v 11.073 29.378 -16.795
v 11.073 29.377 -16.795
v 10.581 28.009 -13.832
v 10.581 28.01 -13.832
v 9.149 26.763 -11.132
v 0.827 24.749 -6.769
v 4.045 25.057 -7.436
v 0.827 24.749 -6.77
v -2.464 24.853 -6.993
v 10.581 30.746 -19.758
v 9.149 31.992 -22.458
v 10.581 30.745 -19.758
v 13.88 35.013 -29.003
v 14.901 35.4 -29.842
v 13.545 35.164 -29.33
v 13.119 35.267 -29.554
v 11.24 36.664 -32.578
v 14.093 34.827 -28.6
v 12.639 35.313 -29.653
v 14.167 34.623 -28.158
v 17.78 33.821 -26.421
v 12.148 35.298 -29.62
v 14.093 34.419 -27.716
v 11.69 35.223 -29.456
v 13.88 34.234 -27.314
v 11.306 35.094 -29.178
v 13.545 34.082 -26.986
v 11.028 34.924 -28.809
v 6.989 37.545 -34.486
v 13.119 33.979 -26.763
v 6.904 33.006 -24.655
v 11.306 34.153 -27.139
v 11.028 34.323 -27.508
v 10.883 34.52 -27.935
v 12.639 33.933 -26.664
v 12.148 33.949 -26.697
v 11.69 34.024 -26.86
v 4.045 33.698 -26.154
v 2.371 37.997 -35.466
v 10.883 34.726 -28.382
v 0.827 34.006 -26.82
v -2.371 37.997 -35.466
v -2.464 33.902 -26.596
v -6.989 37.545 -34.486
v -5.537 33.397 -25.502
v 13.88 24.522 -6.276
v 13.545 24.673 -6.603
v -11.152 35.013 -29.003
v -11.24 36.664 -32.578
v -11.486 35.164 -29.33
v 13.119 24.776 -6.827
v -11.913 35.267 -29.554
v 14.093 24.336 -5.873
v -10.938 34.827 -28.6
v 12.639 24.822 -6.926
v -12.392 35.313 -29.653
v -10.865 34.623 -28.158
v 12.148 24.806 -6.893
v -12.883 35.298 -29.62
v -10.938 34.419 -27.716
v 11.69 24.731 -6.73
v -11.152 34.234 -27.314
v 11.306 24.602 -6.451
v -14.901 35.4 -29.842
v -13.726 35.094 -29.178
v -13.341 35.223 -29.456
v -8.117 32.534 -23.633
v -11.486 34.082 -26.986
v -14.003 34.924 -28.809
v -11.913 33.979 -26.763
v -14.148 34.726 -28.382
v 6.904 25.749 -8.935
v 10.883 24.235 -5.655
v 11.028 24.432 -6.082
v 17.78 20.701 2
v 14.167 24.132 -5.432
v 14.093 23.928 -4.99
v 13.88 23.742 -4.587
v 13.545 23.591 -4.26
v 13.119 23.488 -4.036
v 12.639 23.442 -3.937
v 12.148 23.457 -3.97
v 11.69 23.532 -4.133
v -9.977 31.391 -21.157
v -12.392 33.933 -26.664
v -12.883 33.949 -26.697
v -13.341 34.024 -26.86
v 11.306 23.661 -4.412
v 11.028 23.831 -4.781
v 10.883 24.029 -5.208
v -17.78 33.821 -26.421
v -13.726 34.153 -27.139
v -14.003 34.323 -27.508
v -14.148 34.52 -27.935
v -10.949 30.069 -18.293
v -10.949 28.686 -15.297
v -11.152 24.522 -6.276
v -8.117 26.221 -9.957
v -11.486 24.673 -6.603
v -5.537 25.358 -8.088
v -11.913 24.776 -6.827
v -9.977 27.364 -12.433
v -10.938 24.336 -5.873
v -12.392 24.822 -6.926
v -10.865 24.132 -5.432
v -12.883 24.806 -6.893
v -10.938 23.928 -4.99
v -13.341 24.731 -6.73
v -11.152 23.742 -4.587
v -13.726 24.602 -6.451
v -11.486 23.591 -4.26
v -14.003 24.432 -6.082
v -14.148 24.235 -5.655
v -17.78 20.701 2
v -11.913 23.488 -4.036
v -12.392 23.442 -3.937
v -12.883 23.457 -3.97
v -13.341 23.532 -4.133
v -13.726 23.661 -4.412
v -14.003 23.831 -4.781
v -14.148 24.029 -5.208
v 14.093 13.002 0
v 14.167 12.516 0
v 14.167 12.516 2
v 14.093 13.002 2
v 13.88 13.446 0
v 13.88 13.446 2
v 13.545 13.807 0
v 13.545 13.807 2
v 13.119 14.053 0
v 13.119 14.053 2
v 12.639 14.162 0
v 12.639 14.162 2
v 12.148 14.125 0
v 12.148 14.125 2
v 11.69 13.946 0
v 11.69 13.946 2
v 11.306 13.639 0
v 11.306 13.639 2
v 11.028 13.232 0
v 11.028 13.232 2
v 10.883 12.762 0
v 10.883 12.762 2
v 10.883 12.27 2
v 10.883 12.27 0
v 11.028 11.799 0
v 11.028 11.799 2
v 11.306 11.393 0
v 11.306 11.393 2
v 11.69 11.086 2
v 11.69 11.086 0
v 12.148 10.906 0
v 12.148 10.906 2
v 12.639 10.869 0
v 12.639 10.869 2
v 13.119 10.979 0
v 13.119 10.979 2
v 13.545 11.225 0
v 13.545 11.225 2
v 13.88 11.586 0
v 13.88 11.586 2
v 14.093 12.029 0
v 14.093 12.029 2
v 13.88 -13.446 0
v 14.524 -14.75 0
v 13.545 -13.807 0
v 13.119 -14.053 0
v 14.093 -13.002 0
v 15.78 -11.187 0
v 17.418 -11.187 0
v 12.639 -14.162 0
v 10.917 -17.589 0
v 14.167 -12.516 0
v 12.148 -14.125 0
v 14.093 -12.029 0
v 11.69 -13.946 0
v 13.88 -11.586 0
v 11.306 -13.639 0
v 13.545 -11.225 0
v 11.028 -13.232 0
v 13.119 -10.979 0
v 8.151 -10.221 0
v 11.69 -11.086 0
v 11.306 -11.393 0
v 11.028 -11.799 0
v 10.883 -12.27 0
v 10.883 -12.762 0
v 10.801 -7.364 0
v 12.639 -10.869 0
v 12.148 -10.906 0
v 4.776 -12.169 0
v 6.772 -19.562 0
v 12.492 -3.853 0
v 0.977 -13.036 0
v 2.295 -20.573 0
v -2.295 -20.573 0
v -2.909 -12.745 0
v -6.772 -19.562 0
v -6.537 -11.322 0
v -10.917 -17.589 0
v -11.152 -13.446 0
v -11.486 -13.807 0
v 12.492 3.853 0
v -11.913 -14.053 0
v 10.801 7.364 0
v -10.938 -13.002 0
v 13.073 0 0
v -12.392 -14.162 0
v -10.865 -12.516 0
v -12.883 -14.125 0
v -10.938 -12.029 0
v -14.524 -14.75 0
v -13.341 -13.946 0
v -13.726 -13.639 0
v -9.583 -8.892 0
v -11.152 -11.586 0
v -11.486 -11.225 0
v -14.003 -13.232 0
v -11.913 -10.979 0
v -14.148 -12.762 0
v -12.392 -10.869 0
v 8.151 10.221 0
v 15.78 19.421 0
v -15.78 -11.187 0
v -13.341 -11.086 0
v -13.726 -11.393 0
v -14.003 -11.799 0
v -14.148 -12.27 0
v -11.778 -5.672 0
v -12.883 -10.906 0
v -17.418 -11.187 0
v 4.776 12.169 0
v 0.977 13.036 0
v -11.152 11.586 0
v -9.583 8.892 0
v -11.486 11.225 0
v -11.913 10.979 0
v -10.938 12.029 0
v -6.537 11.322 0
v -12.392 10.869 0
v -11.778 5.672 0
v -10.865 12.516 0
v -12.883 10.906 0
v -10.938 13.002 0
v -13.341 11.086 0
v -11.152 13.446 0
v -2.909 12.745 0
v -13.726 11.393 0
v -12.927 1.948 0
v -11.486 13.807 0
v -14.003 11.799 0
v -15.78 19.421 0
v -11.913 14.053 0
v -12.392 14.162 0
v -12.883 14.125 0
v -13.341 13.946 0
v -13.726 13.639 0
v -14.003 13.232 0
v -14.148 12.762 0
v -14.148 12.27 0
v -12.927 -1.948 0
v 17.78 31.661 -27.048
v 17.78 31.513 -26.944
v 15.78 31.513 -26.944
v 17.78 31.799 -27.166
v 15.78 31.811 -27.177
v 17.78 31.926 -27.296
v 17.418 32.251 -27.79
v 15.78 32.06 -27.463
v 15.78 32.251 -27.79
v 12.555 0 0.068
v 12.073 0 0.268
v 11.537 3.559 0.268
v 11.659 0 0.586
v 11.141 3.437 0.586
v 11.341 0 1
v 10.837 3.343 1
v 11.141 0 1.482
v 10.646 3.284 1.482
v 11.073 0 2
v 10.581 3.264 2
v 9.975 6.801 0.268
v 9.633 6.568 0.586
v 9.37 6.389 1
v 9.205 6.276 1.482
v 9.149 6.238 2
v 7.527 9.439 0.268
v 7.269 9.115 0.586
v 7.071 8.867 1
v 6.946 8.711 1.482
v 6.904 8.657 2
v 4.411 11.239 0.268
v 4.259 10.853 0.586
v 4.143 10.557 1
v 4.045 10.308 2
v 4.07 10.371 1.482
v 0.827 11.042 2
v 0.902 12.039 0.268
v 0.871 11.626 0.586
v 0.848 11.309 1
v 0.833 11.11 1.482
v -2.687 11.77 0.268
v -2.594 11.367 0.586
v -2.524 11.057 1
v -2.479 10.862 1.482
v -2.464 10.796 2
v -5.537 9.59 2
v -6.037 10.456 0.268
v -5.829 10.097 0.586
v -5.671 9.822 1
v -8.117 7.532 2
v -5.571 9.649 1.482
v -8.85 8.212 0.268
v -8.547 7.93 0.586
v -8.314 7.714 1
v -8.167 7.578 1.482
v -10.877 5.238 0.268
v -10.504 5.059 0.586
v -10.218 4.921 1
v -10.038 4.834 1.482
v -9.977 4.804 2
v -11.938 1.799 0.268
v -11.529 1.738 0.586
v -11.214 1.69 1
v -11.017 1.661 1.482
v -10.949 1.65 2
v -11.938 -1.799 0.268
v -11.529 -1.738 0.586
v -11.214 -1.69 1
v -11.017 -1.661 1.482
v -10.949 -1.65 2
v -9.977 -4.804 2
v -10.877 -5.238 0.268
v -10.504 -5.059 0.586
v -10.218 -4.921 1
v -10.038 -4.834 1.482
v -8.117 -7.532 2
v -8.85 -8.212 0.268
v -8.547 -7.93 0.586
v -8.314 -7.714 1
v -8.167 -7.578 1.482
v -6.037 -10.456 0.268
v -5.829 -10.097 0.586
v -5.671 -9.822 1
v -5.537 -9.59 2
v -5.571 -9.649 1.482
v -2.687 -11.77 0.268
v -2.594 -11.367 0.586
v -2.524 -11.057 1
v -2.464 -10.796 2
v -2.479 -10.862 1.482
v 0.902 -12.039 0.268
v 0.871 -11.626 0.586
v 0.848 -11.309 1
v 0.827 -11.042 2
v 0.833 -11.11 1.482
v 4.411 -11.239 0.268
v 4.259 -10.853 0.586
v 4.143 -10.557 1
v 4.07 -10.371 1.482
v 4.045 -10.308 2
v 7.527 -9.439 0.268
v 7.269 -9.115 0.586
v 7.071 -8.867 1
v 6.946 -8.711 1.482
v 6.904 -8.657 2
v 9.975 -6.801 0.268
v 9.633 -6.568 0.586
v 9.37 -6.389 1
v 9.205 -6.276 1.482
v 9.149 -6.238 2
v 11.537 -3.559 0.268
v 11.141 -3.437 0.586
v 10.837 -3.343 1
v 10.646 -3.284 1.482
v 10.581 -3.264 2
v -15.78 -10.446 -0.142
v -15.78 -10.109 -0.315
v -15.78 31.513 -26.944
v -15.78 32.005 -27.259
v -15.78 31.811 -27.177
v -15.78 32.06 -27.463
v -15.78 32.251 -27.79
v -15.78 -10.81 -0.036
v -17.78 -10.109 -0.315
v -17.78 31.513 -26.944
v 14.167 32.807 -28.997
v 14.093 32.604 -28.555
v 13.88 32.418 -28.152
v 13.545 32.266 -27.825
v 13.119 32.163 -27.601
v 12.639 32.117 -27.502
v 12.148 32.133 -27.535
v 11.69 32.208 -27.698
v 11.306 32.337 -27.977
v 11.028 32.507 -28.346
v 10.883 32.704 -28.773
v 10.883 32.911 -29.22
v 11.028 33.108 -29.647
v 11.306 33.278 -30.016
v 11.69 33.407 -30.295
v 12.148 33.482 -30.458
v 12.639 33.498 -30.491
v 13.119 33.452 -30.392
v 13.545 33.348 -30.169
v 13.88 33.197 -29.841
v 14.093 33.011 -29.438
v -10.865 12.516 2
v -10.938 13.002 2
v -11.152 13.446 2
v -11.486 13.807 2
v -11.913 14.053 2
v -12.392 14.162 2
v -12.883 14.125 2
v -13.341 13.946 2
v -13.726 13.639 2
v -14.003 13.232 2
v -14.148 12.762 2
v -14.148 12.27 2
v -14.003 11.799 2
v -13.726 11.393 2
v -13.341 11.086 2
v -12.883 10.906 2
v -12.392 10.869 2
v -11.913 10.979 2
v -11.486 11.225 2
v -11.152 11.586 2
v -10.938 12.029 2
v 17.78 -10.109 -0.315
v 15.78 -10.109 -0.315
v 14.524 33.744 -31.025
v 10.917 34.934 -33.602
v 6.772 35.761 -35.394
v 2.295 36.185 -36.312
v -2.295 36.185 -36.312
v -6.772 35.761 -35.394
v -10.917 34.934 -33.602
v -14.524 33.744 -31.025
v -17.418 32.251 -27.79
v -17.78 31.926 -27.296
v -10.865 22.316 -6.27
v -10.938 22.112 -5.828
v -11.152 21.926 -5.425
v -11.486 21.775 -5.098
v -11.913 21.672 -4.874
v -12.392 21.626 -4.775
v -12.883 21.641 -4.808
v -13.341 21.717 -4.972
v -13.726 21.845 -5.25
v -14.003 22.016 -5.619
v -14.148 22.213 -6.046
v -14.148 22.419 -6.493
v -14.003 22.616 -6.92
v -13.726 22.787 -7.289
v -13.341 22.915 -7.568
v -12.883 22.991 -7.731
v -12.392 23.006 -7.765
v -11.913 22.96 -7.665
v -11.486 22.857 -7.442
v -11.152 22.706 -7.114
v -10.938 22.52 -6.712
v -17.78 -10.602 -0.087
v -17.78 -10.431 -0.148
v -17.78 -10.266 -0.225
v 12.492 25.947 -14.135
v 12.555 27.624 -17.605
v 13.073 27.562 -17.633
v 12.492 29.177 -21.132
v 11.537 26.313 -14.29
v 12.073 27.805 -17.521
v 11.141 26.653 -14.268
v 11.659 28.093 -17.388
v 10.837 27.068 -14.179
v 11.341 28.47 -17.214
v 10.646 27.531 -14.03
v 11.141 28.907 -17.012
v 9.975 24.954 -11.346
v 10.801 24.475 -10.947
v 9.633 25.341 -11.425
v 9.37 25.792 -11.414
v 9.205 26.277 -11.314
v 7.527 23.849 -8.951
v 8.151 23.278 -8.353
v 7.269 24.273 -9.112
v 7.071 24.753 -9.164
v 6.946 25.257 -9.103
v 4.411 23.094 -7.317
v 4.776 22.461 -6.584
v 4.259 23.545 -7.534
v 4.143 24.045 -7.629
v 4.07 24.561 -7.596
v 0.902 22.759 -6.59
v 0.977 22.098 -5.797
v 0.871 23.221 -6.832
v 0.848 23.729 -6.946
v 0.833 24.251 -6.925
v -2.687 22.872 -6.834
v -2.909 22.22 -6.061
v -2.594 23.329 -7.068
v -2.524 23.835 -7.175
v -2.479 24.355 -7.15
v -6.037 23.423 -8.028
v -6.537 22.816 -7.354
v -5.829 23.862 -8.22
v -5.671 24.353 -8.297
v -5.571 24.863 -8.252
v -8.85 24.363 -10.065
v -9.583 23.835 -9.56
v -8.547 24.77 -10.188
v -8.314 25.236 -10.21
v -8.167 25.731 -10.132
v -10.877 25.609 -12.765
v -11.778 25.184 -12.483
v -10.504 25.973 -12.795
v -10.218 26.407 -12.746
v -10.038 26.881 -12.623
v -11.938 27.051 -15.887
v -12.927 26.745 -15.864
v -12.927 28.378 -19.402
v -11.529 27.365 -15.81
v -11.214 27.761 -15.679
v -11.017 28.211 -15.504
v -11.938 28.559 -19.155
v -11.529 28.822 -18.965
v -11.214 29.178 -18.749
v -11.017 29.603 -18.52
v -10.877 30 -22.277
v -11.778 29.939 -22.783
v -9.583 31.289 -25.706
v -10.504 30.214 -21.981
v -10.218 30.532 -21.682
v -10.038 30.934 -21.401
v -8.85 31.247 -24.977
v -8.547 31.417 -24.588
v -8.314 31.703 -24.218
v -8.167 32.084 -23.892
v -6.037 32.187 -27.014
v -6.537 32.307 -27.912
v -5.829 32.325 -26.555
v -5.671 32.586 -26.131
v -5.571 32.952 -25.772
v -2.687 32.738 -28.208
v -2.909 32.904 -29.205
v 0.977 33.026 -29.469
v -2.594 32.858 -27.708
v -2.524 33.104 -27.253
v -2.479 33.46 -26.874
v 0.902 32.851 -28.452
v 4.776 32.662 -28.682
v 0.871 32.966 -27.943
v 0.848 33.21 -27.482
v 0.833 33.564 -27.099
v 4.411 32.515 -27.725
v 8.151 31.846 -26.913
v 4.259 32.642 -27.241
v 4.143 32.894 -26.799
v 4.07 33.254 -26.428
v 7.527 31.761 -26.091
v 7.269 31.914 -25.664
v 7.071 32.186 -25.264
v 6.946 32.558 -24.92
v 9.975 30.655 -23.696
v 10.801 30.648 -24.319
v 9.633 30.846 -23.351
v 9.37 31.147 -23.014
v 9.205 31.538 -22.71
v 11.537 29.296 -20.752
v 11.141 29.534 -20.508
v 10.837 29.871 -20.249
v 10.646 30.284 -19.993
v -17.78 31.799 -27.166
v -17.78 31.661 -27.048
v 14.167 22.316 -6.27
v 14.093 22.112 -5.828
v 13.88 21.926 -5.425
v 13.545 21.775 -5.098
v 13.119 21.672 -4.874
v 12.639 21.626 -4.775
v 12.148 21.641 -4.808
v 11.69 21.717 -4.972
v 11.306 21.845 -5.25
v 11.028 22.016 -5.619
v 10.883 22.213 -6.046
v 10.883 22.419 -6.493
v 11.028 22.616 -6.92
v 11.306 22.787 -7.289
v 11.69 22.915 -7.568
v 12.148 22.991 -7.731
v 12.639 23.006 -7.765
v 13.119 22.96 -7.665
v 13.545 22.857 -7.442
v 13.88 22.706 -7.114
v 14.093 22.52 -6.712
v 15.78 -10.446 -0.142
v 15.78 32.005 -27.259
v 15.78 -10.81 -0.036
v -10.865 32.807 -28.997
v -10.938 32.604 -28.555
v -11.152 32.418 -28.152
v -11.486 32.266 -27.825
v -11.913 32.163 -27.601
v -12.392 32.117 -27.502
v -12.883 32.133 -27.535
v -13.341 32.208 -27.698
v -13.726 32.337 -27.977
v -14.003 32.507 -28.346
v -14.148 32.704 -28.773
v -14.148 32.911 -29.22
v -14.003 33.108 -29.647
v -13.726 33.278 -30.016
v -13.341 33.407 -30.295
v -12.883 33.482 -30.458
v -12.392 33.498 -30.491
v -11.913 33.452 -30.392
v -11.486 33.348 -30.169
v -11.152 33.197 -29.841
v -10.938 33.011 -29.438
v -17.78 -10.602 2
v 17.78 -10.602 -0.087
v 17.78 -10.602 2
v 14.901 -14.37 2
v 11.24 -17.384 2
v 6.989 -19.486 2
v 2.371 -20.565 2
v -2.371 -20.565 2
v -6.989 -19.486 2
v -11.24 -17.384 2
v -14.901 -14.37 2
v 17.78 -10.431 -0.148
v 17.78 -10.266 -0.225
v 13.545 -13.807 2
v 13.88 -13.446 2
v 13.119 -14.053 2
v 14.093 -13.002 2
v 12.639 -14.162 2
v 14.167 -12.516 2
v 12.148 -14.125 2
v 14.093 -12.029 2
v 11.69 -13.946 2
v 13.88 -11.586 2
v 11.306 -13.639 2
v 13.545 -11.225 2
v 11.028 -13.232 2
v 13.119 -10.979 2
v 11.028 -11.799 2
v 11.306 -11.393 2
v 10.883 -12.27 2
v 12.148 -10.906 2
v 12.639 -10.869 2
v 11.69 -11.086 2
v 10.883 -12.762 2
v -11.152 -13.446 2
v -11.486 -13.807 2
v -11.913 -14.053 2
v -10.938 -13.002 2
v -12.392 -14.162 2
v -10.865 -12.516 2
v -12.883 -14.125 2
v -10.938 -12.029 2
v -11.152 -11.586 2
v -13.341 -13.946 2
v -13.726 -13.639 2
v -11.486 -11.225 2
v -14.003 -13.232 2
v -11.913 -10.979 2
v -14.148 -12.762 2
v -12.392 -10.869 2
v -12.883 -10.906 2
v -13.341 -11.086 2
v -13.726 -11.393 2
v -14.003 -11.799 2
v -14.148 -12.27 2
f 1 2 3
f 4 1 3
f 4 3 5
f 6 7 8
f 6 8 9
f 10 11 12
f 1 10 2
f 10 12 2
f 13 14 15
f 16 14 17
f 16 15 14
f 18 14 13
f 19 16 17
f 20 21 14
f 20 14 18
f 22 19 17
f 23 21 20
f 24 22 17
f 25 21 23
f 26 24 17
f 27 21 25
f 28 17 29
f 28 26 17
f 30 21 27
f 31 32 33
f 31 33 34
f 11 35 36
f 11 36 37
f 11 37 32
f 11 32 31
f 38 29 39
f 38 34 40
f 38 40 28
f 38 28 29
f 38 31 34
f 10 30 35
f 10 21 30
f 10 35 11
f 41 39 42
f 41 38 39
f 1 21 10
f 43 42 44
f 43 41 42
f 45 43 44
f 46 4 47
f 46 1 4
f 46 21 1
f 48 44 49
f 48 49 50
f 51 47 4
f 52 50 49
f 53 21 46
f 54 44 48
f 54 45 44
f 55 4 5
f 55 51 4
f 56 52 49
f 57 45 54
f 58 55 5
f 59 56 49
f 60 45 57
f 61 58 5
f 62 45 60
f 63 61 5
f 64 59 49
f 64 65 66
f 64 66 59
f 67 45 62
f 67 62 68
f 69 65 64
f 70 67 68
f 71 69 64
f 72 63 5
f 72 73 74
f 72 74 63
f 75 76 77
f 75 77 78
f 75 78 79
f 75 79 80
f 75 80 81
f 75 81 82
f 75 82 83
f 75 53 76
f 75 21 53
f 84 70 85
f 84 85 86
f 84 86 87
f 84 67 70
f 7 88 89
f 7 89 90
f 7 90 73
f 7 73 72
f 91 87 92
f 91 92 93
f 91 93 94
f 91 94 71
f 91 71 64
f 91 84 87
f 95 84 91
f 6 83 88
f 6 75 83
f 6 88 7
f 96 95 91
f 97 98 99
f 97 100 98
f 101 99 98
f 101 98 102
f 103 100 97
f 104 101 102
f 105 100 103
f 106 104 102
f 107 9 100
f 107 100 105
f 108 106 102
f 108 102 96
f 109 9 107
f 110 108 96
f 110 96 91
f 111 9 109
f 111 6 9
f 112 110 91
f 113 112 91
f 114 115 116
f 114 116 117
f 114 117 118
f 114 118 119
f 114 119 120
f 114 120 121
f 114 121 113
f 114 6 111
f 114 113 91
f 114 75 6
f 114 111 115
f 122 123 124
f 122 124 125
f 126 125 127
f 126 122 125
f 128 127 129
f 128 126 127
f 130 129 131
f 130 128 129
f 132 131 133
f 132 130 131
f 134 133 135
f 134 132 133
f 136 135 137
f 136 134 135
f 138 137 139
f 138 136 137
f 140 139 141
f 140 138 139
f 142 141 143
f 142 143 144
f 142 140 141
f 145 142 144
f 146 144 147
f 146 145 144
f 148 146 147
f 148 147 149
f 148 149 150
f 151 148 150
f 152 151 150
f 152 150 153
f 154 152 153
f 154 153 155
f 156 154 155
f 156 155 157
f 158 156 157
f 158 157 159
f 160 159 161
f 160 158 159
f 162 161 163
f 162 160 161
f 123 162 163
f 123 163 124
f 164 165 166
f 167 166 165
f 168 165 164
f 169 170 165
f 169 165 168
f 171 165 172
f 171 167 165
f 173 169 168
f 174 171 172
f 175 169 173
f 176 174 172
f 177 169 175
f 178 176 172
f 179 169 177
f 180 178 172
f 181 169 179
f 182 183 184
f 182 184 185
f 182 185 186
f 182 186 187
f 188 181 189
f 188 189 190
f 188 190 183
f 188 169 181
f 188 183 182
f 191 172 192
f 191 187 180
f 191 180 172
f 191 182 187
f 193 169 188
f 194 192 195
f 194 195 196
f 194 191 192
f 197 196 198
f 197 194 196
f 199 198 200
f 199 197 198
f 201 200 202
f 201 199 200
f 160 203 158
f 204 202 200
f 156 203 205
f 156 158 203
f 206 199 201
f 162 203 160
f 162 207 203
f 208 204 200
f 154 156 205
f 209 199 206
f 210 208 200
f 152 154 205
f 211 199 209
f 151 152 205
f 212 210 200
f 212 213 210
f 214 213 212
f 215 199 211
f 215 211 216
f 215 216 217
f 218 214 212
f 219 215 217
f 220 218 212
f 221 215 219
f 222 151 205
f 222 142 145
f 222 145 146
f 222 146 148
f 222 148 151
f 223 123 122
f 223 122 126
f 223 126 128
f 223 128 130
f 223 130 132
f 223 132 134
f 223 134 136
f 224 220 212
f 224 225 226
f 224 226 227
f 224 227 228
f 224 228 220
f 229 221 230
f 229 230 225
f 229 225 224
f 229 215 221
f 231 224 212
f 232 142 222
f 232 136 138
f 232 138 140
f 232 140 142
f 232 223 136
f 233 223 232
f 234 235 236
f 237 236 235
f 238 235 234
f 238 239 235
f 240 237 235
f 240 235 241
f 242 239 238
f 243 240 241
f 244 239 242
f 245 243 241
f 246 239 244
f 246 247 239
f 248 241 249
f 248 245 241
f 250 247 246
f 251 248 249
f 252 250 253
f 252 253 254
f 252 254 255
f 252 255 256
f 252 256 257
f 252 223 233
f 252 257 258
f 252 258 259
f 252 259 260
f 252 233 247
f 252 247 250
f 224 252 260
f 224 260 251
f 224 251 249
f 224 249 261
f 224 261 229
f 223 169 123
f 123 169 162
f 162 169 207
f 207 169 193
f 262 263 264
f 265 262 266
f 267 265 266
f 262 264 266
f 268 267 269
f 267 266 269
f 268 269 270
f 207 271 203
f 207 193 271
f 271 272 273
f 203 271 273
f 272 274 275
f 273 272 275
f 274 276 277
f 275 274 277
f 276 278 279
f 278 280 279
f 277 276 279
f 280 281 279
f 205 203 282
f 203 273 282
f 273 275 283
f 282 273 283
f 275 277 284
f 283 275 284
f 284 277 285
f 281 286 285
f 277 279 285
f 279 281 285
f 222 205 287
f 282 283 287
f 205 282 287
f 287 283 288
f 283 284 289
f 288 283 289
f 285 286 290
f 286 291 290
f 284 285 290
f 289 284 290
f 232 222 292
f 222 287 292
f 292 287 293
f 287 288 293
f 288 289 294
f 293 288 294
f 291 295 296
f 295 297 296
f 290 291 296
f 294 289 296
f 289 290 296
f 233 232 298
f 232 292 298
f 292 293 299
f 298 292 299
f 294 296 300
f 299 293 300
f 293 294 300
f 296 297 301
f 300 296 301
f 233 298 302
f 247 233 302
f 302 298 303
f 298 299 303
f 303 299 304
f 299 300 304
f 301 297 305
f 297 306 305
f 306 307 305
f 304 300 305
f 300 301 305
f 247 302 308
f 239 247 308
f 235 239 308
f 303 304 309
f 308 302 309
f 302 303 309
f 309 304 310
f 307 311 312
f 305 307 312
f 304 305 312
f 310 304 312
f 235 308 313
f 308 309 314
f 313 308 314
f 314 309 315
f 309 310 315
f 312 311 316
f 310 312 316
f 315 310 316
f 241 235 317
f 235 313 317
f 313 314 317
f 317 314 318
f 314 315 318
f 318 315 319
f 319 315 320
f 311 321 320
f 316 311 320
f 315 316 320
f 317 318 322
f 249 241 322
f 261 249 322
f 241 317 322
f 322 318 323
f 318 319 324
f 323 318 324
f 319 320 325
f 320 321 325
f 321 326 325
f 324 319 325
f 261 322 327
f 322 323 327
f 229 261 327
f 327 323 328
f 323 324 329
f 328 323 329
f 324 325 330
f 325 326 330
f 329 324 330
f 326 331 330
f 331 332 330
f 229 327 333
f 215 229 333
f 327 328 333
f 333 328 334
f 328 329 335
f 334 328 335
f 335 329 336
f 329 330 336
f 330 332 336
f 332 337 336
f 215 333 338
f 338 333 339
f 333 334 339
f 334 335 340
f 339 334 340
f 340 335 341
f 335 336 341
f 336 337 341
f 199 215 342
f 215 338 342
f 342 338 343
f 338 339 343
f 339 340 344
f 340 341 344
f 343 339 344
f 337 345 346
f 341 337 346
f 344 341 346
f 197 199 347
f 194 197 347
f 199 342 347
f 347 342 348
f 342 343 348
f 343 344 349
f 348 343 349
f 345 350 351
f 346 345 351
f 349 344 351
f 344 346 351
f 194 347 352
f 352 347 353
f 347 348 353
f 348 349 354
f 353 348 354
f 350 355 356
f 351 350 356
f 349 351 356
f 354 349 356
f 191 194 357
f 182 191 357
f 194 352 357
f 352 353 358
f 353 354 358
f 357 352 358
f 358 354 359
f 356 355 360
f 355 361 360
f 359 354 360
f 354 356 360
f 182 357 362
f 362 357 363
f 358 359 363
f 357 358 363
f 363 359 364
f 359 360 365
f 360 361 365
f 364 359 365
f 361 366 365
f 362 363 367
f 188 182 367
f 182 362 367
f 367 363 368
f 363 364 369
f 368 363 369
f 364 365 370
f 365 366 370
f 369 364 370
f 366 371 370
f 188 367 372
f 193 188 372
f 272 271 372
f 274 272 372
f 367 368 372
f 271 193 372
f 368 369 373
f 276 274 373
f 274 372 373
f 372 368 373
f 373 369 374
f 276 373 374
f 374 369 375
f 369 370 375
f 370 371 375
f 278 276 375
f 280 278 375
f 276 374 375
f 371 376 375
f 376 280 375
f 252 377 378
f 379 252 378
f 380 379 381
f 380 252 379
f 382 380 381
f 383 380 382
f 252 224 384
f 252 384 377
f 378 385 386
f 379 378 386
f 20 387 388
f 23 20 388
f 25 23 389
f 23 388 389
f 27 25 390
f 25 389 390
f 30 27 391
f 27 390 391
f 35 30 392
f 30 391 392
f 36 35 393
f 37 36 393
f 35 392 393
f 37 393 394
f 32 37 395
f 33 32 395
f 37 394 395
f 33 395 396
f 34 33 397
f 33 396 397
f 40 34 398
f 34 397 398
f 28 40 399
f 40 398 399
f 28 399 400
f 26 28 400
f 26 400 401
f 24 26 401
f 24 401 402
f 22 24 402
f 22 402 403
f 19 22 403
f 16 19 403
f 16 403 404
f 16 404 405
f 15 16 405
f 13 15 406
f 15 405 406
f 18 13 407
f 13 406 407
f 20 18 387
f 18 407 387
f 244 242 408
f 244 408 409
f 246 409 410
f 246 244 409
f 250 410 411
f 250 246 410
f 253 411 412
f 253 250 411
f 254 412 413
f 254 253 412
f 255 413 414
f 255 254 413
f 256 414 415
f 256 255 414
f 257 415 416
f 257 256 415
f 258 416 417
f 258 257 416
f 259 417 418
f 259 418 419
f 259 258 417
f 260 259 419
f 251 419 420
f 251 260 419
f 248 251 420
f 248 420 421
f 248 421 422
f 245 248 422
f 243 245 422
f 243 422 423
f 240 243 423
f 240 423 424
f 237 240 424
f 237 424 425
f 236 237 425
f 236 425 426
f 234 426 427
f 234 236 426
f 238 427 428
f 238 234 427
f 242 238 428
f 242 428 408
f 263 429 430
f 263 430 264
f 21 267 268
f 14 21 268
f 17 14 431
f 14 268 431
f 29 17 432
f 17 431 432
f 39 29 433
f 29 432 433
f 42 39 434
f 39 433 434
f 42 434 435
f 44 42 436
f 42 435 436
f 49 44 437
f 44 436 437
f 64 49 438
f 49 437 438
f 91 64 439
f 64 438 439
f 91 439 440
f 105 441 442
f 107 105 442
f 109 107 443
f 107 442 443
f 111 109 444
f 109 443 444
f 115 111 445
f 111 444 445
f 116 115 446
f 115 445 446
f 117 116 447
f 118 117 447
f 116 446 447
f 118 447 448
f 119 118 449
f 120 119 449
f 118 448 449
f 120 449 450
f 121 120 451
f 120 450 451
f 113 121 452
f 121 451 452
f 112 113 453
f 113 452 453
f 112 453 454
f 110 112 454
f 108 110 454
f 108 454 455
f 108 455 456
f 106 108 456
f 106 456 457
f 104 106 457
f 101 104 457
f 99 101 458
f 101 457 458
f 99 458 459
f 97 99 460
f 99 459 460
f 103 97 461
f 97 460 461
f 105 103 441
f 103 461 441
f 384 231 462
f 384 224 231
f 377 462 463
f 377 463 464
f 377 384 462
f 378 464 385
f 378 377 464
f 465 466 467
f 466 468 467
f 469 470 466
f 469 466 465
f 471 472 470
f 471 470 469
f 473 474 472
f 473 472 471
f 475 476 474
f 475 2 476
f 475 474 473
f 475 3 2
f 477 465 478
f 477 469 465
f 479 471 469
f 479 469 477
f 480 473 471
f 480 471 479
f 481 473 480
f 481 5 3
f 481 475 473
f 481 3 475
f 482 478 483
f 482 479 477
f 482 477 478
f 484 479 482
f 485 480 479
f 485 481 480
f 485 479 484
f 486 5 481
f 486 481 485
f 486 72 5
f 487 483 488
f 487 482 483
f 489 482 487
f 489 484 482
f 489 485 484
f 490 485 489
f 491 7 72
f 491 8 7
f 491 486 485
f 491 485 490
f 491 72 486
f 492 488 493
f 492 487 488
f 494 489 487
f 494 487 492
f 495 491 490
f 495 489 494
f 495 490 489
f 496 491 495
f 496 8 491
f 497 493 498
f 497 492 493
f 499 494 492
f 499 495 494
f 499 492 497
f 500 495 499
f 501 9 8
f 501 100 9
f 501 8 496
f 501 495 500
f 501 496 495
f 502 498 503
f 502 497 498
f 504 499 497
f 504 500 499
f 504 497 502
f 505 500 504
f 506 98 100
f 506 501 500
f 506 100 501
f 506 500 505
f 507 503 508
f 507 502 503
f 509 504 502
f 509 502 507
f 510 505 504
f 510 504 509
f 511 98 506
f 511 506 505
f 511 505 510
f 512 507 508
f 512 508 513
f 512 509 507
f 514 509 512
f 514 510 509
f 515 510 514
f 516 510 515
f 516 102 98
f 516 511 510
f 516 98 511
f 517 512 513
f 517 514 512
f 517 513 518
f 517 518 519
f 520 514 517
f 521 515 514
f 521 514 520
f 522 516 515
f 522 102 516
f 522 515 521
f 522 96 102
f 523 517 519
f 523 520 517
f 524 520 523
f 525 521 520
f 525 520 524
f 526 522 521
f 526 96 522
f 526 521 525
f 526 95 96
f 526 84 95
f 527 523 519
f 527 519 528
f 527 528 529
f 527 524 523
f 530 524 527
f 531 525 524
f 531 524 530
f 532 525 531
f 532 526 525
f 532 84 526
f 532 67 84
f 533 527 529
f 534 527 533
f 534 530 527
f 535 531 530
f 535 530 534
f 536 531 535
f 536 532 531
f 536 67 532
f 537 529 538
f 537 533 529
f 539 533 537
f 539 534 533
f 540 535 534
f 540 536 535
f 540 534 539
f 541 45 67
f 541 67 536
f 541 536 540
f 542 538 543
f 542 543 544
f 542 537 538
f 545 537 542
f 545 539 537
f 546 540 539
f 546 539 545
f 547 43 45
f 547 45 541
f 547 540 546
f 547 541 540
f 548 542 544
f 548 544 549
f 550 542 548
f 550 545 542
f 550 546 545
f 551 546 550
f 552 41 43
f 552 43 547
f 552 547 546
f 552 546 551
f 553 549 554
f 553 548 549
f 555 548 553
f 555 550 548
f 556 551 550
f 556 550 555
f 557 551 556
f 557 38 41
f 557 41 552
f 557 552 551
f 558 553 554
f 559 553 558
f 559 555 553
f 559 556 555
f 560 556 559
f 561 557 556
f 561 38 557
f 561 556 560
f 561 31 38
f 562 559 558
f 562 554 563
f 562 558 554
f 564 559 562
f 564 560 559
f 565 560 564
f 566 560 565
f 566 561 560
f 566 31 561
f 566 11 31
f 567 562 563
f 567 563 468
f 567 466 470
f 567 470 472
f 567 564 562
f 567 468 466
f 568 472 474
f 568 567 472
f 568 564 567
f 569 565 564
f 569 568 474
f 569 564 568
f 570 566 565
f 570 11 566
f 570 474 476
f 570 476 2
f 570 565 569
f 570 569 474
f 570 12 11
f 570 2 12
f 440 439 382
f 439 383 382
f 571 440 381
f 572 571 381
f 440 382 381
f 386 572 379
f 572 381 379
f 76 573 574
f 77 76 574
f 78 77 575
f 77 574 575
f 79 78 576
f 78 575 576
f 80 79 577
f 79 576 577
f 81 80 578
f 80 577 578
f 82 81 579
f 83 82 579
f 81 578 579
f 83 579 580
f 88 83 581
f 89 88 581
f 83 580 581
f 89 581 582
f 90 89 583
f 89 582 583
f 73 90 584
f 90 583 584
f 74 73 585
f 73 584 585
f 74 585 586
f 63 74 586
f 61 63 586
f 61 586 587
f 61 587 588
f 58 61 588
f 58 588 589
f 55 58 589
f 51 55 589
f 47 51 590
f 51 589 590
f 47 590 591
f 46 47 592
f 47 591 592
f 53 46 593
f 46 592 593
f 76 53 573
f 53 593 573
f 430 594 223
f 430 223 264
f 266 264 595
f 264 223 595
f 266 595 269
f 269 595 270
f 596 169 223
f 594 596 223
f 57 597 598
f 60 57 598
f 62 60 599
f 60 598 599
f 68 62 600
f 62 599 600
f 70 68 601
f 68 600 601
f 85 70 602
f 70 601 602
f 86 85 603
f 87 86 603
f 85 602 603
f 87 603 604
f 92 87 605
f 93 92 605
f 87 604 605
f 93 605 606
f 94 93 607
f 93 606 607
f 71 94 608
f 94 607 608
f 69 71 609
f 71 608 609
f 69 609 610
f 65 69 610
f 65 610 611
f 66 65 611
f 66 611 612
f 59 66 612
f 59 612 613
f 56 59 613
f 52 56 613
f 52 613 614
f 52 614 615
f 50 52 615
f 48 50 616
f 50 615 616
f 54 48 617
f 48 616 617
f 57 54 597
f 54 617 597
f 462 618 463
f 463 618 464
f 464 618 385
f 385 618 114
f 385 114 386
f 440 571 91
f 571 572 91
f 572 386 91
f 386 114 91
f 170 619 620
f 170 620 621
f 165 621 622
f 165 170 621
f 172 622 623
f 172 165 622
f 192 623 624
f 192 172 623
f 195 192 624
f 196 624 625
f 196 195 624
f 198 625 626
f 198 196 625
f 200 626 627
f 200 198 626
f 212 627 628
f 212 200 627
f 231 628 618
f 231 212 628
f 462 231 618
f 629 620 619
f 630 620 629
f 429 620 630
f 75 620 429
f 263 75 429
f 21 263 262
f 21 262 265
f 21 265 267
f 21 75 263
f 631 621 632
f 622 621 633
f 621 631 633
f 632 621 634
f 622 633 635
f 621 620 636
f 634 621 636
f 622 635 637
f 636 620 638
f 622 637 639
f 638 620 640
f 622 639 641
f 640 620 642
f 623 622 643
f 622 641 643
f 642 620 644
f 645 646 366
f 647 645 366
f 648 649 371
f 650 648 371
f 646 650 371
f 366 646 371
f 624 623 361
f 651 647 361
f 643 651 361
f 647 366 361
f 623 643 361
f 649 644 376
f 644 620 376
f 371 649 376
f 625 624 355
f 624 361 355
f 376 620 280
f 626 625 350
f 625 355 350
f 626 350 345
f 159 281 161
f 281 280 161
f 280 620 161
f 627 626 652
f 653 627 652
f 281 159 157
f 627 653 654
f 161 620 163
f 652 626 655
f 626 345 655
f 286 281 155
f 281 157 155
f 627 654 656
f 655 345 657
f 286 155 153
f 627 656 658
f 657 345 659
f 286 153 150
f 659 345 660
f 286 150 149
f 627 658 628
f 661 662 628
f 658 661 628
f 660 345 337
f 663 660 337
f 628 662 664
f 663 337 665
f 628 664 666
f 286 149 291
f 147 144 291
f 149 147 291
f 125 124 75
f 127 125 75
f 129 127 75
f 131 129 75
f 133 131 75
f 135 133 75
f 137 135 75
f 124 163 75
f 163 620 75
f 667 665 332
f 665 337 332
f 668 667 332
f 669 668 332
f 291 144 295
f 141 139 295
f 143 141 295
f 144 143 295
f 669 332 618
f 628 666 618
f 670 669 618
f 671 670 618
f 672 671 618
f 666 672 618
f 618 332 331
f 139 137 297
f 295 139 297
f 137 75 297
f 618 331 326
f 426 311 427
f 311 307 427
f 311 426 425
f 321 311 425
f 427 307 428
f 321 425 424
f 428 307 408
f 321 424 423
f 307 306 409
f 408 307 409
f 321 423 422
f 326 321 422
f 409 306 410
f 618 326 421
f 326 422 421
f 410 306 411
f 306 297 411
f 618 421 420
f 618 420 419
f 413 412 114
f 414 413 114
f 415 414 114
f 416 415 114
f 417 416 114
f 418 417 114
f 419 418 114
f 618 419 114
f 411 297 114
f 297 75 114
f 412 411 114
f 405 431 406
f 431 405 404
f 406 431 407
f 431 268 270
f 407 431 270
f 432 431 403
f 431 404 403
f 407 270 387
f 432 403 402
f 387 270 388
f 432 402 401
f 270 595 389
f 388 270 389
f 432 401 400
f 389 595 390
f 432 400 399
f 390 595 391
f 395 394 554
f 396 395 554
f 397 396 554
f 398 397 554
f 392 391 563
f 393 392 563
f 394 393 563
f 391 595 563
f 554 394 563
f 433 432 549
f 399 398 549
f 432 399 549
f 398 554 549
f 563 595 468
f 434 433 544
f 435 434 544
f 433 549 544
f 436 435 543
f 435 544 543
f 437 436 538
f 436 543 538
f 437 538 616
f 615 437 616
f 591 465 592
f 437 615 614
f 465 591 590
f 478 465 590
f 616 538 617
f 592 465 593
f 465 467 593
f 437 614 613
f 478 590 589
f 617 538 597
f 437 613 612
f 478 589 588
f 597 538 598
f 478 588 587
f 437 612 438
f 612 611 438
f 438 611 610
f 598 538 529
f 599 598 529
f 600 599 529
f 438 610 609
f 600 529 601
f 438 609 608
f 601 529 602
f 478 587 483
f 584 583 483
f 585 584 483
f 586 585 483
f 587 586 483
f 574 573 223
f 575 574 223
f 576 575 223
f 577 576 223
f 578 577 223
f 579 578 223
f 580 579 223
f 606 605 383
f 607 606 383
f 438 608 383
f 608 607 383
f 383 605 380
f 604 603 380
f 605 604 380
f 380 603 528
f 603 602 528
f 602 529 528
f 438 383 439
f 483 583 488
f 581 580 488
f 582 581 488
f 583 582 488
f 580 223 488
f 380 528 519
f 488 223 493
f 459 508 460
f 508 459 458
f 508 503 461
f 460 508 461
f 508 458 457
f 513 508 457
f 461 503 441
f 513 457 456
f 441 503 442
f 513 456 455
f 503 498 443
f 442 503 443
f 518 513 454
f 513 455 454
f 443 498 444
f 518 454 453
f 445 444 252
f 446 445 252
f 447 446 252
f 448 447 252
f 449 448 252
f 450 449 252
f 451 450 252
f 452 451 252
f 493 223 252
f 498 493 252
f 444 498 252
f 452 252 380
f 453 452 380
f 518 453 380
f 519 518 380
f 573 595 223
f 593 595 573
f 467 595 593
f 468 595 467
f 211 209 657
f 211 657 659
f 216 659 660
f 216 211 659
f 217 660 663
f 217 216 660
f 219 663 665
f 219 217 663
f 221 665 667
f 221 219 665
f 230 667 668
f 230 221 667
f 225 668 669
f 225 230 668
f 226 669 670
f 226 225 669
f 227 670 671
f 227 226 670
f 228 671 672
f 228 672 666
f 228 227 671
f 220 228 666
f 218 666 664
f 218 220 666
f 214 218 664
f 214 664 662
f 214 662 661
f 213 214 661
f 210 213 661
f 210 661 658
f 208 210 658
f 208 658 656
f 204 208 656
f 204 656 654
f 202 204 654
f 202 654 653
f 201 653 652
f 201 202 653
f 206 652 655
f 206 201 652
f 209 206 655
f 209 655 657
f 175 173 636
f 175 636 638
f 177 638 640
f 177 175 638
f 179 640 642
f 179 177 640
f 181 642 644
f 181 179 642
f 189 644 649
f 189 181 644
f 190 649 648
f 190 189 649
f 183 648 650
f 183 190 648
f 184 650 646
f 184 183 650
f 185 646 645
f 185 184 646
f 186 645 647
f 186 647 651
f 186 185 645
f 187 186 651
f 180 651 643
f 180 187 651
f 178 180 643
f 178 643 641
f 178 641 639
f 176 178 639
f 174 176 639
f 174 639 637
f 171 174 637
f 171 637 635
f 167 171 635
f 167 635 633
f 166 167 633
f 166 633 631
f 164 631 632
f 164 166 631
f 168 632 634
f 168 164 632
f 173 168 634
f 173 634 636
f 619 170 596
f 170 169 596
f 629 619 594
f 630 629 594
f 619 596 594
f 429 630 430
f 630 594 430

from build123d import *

# Parameters (mm, degrees)
SKETCH1_R           = 1.651
SKETCH1_R_2         = 11.07313
BOSS_EXTRUDE1_DEPTH = 2
BOSS_EXTRUDE2_DEPTH = 2
FILLET2_R           = 2
FILLET3_R           = 2


with BuildPart() as part:
    # Sketch1 → Boss-Extrude1 (new body)
    with BuildSketch(Plane.XY):
        with BuildLine():
            Line((-17.78, -10.602028155), (-17.78, 20.701))
            Line((-17.78, 20.701), (17.78, 20.701))
            Line((17.78, 20.701), (17.78, -10.602028155))
            ThreePointArc((17.78, -10.602028155), (0, -20.701), (-17.78, -10.602028155))
        make_face()
        with Locations((-12.515790027, -12.515790027)):
            Circle(SKETCH1_R, mode=Mode.SUBTRACT)
        with Locations((12.515790027, -12.515790027)):
            Circle(SKETCH1_R, mode=Mode.SUBTRACT)
        with Locations((12.515790027, 12.515790027)):
            Circle(SKETCH1_R, mode=Mode.SUBTRACT)
        with Locations((-12.515790027, 12.515790027)):
            Circle(SKETCH1_R, mode=Mode.SUBTRACT)
        Circle(SKETCH1_R_2, mode=Mode.SUBTRACT)
    boss_extrude1 = extrude(amount=BOSS_EXTRUDE1_DEPTH)

    # Mirror1: Boss-Extrude1 across plane
    add(boss_extrude1.mirror(Plane(origin=(0, 13.78083487, -8.816600885), x_dir=(0, 0.5389178124813573, 0.8423583509352233), z_dir=(0, -0.8423583509352232, 0.5389178124813573))))

    # Sketch2 → Boss-Extrude2 (add)
    with BuildSketch(Plane.ZY.offset(17.78)):
        Polygon((0, -10.602028155), (-27.25903588, 32.005352748), (0, 19.421454752), align=None)
    boss_extrude2 = extrude(amount=-BOSS_EXTRUDE2_DEPTH)

    # Mirror2: Boss-Extrude2 across plane
    add(boss_extrude2.mirror(Plane(origin=(0, 0, 0), x_dir=(0, 0, 1), z_dir=(1, 0, 0))))

    # Fillet2
    fillet2_edges = [part.edges().sort_by_distance(p)[0] for p in [
        (-11.07313, 0, 0),
        (-11.07313, 27.561669739, -17.63320177),
    ]]
    fillet(fillet2_edges, radius=FILLET2_R - 0.0001)  # a hair under: the kernel refuses the full size

    # Fillet3
    fillet3_edges = [part.edges().sort_by_distance(p)[0] for p in [
        (-16.78, -10.602028155, 0),
        (-16.78, 32.005352748, -27.25903588),
        (16.78, -10.602028155, 0),
        (16.78, 32.005352748, -27.25903588),
    ]]
    fillet(fillet3_edges, radius=FILLET3_R)


solid = part.part
